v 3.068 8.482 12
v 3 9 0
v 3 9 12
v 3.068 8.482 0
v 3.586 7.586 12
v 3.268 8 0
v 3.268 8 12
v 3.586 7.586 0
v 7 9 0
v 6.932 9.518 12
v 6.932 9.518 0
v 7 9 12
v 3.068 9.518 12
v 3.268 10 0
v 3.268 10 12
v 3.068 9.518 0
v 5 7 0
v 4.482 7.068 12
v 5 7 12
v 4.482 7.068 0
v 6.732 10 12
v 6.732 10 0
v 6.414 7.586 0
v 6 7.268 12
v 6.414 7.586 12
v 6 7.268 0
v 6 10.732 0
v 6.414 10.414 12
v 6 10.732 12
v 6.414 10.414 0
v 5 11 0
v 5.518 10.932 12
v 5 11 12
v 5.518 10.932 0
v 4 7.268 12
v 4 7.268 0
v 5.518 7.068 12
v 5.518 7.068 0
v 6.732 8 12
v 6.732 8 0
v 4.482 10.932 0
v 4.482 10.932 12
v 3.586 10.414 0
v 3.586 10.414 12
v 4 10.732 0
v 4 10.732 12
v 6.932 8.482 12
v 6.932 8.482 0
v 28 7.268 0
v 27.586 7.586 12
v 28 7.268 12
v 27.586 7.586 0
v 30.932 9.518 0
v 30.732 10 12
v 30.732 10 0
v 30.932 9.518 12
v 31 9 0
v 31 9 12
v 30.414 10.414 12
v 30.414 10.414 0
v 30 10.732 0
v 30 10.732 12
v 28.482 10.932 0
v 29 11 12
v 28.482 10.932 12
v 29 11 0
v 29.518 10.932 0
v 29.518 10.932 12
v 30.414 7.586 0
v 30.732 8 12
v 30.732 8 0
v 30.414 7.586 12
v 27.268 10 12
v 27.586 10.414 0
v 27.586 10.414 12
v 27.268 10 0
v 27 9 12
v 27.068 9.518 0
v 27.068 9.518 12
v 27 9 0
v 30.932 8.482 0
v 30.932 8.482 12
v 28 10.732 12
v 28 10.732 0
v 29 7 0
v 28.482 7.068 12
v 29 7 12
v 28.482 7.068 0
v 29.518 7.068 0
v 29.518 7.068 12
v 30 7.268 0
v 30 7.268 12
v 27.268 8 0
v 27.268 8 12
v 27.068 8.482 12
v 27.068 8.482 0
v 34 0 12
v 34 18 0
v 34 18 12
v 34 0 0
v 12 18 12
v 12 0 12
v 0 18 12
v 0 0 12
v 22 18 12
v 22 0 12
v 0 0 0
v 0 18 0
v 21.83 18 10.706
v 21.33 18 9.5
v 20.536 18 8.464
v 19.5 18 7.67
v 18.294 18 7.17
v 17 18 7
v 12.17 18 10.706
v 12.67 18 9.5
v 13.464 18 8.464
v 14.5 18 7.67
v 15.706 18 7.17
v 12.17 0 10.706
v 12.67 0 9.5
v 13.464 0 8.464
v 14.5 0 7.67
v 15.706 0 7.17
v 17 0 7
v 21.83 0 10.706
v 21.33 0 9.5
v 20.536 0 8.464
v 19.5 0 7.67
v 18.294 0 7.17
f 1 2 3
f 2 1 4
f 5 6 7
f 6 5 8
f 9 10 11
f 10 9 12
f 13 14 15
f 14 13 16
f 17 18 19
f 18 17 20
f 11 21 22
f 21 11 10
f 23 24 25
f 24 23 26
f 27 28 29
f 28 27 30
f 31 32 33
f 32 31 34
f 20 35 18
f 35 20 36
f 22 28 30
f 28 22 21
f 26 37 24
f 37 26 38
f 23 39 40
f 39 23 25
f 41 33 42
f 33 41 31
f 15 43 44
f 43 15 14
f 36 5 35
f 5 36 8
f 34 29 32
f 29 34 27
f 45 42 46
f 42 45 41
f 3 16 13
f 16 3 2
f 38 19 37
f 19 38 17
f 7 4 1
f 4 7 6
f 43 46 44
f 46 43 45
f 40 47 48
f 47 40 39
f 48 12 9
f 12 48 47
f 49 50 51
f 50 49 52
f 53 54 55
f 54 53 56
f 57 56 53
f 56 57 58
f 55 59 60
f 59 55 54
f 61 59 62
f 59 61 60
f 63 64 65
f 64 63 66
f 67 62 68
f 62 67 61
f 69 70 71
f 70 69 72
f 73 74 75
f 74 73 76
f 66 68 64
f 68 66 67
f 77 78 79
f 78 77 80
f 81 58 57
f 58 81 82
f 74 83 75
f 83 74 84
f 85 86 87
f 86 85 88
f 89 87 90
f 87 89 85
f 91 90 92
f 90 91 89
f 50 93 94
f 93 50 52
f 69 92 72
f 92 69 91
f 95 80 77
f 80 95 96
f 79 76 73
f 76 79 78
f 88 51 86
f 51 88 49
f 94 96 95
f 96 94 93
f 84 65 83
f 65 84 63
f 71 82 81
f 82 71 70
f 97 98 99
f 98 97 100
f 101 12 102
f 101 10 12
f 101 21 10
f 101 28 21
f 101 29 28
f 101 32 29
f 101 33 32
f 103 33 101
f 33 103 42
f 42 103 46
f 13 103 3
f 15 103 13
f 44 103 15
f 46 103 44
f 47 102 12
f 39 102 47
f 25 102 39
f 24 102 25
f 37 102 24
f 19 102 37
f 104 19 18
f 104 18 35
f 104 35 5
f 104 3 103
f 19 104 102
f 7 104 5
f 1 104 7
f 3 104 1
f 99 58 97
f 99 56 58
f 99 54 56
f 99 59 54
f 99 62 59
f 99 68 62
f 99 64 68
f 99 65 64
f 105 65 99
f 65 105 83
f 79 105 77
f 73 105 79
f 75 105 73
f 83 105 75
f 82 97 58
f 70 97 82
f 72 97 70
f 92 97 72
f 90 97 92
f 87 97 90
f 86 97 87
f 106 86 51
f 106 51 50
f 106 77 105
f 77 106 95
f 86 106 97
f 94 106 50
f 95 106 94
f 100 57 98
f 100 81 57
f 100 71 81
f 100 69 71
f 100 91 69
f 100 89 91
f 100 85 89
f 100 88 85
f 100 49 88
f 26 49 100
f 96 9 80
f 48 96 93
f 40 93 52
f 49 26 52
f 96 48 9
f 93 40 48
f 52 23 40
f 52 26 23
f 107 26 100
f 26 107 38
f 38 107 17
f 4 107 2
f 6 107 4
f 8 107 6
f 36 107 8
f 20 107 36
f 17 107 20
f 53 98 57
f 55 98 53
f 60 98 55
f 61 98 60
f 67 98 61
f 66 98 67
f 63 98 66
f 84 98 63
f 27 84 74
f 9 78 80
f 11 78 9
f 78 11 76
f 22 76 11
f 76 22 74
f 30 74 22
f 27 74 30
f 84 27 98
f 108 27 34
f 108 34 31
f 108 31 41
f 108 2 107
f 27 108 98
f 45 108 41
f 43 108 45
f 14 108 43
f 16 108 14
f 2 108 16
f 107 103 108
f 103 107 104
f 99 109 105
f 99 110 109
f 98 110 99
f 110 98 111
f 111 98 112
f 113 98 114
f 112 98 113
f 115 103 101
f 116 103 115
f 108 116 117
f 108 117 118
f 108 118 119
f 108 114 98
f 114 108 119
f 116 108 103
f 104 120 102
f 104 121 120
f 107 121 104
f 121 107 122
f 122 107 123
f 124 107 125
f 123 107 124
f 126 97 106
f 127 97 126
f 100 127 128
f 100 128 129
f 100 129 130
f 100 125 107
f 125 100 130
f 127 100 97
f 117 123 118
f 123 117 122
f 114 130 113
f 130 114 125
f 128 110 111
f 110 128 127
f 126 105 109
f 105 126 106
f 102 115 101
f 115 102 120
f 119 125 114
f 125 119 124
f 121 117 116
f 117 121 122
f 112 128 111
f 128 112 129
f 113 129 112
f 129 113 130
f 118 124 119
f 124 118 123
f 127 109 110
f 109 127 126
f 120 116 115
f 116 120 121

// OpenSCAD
$fn=24;
difference(){cube([34,18,12]);translate([17,19,12])rotate([90,0,0])cylinder(h=20,r=5);for(x=[5,29])translate([x,9,-1])cylinder(h=14,r=2);}
